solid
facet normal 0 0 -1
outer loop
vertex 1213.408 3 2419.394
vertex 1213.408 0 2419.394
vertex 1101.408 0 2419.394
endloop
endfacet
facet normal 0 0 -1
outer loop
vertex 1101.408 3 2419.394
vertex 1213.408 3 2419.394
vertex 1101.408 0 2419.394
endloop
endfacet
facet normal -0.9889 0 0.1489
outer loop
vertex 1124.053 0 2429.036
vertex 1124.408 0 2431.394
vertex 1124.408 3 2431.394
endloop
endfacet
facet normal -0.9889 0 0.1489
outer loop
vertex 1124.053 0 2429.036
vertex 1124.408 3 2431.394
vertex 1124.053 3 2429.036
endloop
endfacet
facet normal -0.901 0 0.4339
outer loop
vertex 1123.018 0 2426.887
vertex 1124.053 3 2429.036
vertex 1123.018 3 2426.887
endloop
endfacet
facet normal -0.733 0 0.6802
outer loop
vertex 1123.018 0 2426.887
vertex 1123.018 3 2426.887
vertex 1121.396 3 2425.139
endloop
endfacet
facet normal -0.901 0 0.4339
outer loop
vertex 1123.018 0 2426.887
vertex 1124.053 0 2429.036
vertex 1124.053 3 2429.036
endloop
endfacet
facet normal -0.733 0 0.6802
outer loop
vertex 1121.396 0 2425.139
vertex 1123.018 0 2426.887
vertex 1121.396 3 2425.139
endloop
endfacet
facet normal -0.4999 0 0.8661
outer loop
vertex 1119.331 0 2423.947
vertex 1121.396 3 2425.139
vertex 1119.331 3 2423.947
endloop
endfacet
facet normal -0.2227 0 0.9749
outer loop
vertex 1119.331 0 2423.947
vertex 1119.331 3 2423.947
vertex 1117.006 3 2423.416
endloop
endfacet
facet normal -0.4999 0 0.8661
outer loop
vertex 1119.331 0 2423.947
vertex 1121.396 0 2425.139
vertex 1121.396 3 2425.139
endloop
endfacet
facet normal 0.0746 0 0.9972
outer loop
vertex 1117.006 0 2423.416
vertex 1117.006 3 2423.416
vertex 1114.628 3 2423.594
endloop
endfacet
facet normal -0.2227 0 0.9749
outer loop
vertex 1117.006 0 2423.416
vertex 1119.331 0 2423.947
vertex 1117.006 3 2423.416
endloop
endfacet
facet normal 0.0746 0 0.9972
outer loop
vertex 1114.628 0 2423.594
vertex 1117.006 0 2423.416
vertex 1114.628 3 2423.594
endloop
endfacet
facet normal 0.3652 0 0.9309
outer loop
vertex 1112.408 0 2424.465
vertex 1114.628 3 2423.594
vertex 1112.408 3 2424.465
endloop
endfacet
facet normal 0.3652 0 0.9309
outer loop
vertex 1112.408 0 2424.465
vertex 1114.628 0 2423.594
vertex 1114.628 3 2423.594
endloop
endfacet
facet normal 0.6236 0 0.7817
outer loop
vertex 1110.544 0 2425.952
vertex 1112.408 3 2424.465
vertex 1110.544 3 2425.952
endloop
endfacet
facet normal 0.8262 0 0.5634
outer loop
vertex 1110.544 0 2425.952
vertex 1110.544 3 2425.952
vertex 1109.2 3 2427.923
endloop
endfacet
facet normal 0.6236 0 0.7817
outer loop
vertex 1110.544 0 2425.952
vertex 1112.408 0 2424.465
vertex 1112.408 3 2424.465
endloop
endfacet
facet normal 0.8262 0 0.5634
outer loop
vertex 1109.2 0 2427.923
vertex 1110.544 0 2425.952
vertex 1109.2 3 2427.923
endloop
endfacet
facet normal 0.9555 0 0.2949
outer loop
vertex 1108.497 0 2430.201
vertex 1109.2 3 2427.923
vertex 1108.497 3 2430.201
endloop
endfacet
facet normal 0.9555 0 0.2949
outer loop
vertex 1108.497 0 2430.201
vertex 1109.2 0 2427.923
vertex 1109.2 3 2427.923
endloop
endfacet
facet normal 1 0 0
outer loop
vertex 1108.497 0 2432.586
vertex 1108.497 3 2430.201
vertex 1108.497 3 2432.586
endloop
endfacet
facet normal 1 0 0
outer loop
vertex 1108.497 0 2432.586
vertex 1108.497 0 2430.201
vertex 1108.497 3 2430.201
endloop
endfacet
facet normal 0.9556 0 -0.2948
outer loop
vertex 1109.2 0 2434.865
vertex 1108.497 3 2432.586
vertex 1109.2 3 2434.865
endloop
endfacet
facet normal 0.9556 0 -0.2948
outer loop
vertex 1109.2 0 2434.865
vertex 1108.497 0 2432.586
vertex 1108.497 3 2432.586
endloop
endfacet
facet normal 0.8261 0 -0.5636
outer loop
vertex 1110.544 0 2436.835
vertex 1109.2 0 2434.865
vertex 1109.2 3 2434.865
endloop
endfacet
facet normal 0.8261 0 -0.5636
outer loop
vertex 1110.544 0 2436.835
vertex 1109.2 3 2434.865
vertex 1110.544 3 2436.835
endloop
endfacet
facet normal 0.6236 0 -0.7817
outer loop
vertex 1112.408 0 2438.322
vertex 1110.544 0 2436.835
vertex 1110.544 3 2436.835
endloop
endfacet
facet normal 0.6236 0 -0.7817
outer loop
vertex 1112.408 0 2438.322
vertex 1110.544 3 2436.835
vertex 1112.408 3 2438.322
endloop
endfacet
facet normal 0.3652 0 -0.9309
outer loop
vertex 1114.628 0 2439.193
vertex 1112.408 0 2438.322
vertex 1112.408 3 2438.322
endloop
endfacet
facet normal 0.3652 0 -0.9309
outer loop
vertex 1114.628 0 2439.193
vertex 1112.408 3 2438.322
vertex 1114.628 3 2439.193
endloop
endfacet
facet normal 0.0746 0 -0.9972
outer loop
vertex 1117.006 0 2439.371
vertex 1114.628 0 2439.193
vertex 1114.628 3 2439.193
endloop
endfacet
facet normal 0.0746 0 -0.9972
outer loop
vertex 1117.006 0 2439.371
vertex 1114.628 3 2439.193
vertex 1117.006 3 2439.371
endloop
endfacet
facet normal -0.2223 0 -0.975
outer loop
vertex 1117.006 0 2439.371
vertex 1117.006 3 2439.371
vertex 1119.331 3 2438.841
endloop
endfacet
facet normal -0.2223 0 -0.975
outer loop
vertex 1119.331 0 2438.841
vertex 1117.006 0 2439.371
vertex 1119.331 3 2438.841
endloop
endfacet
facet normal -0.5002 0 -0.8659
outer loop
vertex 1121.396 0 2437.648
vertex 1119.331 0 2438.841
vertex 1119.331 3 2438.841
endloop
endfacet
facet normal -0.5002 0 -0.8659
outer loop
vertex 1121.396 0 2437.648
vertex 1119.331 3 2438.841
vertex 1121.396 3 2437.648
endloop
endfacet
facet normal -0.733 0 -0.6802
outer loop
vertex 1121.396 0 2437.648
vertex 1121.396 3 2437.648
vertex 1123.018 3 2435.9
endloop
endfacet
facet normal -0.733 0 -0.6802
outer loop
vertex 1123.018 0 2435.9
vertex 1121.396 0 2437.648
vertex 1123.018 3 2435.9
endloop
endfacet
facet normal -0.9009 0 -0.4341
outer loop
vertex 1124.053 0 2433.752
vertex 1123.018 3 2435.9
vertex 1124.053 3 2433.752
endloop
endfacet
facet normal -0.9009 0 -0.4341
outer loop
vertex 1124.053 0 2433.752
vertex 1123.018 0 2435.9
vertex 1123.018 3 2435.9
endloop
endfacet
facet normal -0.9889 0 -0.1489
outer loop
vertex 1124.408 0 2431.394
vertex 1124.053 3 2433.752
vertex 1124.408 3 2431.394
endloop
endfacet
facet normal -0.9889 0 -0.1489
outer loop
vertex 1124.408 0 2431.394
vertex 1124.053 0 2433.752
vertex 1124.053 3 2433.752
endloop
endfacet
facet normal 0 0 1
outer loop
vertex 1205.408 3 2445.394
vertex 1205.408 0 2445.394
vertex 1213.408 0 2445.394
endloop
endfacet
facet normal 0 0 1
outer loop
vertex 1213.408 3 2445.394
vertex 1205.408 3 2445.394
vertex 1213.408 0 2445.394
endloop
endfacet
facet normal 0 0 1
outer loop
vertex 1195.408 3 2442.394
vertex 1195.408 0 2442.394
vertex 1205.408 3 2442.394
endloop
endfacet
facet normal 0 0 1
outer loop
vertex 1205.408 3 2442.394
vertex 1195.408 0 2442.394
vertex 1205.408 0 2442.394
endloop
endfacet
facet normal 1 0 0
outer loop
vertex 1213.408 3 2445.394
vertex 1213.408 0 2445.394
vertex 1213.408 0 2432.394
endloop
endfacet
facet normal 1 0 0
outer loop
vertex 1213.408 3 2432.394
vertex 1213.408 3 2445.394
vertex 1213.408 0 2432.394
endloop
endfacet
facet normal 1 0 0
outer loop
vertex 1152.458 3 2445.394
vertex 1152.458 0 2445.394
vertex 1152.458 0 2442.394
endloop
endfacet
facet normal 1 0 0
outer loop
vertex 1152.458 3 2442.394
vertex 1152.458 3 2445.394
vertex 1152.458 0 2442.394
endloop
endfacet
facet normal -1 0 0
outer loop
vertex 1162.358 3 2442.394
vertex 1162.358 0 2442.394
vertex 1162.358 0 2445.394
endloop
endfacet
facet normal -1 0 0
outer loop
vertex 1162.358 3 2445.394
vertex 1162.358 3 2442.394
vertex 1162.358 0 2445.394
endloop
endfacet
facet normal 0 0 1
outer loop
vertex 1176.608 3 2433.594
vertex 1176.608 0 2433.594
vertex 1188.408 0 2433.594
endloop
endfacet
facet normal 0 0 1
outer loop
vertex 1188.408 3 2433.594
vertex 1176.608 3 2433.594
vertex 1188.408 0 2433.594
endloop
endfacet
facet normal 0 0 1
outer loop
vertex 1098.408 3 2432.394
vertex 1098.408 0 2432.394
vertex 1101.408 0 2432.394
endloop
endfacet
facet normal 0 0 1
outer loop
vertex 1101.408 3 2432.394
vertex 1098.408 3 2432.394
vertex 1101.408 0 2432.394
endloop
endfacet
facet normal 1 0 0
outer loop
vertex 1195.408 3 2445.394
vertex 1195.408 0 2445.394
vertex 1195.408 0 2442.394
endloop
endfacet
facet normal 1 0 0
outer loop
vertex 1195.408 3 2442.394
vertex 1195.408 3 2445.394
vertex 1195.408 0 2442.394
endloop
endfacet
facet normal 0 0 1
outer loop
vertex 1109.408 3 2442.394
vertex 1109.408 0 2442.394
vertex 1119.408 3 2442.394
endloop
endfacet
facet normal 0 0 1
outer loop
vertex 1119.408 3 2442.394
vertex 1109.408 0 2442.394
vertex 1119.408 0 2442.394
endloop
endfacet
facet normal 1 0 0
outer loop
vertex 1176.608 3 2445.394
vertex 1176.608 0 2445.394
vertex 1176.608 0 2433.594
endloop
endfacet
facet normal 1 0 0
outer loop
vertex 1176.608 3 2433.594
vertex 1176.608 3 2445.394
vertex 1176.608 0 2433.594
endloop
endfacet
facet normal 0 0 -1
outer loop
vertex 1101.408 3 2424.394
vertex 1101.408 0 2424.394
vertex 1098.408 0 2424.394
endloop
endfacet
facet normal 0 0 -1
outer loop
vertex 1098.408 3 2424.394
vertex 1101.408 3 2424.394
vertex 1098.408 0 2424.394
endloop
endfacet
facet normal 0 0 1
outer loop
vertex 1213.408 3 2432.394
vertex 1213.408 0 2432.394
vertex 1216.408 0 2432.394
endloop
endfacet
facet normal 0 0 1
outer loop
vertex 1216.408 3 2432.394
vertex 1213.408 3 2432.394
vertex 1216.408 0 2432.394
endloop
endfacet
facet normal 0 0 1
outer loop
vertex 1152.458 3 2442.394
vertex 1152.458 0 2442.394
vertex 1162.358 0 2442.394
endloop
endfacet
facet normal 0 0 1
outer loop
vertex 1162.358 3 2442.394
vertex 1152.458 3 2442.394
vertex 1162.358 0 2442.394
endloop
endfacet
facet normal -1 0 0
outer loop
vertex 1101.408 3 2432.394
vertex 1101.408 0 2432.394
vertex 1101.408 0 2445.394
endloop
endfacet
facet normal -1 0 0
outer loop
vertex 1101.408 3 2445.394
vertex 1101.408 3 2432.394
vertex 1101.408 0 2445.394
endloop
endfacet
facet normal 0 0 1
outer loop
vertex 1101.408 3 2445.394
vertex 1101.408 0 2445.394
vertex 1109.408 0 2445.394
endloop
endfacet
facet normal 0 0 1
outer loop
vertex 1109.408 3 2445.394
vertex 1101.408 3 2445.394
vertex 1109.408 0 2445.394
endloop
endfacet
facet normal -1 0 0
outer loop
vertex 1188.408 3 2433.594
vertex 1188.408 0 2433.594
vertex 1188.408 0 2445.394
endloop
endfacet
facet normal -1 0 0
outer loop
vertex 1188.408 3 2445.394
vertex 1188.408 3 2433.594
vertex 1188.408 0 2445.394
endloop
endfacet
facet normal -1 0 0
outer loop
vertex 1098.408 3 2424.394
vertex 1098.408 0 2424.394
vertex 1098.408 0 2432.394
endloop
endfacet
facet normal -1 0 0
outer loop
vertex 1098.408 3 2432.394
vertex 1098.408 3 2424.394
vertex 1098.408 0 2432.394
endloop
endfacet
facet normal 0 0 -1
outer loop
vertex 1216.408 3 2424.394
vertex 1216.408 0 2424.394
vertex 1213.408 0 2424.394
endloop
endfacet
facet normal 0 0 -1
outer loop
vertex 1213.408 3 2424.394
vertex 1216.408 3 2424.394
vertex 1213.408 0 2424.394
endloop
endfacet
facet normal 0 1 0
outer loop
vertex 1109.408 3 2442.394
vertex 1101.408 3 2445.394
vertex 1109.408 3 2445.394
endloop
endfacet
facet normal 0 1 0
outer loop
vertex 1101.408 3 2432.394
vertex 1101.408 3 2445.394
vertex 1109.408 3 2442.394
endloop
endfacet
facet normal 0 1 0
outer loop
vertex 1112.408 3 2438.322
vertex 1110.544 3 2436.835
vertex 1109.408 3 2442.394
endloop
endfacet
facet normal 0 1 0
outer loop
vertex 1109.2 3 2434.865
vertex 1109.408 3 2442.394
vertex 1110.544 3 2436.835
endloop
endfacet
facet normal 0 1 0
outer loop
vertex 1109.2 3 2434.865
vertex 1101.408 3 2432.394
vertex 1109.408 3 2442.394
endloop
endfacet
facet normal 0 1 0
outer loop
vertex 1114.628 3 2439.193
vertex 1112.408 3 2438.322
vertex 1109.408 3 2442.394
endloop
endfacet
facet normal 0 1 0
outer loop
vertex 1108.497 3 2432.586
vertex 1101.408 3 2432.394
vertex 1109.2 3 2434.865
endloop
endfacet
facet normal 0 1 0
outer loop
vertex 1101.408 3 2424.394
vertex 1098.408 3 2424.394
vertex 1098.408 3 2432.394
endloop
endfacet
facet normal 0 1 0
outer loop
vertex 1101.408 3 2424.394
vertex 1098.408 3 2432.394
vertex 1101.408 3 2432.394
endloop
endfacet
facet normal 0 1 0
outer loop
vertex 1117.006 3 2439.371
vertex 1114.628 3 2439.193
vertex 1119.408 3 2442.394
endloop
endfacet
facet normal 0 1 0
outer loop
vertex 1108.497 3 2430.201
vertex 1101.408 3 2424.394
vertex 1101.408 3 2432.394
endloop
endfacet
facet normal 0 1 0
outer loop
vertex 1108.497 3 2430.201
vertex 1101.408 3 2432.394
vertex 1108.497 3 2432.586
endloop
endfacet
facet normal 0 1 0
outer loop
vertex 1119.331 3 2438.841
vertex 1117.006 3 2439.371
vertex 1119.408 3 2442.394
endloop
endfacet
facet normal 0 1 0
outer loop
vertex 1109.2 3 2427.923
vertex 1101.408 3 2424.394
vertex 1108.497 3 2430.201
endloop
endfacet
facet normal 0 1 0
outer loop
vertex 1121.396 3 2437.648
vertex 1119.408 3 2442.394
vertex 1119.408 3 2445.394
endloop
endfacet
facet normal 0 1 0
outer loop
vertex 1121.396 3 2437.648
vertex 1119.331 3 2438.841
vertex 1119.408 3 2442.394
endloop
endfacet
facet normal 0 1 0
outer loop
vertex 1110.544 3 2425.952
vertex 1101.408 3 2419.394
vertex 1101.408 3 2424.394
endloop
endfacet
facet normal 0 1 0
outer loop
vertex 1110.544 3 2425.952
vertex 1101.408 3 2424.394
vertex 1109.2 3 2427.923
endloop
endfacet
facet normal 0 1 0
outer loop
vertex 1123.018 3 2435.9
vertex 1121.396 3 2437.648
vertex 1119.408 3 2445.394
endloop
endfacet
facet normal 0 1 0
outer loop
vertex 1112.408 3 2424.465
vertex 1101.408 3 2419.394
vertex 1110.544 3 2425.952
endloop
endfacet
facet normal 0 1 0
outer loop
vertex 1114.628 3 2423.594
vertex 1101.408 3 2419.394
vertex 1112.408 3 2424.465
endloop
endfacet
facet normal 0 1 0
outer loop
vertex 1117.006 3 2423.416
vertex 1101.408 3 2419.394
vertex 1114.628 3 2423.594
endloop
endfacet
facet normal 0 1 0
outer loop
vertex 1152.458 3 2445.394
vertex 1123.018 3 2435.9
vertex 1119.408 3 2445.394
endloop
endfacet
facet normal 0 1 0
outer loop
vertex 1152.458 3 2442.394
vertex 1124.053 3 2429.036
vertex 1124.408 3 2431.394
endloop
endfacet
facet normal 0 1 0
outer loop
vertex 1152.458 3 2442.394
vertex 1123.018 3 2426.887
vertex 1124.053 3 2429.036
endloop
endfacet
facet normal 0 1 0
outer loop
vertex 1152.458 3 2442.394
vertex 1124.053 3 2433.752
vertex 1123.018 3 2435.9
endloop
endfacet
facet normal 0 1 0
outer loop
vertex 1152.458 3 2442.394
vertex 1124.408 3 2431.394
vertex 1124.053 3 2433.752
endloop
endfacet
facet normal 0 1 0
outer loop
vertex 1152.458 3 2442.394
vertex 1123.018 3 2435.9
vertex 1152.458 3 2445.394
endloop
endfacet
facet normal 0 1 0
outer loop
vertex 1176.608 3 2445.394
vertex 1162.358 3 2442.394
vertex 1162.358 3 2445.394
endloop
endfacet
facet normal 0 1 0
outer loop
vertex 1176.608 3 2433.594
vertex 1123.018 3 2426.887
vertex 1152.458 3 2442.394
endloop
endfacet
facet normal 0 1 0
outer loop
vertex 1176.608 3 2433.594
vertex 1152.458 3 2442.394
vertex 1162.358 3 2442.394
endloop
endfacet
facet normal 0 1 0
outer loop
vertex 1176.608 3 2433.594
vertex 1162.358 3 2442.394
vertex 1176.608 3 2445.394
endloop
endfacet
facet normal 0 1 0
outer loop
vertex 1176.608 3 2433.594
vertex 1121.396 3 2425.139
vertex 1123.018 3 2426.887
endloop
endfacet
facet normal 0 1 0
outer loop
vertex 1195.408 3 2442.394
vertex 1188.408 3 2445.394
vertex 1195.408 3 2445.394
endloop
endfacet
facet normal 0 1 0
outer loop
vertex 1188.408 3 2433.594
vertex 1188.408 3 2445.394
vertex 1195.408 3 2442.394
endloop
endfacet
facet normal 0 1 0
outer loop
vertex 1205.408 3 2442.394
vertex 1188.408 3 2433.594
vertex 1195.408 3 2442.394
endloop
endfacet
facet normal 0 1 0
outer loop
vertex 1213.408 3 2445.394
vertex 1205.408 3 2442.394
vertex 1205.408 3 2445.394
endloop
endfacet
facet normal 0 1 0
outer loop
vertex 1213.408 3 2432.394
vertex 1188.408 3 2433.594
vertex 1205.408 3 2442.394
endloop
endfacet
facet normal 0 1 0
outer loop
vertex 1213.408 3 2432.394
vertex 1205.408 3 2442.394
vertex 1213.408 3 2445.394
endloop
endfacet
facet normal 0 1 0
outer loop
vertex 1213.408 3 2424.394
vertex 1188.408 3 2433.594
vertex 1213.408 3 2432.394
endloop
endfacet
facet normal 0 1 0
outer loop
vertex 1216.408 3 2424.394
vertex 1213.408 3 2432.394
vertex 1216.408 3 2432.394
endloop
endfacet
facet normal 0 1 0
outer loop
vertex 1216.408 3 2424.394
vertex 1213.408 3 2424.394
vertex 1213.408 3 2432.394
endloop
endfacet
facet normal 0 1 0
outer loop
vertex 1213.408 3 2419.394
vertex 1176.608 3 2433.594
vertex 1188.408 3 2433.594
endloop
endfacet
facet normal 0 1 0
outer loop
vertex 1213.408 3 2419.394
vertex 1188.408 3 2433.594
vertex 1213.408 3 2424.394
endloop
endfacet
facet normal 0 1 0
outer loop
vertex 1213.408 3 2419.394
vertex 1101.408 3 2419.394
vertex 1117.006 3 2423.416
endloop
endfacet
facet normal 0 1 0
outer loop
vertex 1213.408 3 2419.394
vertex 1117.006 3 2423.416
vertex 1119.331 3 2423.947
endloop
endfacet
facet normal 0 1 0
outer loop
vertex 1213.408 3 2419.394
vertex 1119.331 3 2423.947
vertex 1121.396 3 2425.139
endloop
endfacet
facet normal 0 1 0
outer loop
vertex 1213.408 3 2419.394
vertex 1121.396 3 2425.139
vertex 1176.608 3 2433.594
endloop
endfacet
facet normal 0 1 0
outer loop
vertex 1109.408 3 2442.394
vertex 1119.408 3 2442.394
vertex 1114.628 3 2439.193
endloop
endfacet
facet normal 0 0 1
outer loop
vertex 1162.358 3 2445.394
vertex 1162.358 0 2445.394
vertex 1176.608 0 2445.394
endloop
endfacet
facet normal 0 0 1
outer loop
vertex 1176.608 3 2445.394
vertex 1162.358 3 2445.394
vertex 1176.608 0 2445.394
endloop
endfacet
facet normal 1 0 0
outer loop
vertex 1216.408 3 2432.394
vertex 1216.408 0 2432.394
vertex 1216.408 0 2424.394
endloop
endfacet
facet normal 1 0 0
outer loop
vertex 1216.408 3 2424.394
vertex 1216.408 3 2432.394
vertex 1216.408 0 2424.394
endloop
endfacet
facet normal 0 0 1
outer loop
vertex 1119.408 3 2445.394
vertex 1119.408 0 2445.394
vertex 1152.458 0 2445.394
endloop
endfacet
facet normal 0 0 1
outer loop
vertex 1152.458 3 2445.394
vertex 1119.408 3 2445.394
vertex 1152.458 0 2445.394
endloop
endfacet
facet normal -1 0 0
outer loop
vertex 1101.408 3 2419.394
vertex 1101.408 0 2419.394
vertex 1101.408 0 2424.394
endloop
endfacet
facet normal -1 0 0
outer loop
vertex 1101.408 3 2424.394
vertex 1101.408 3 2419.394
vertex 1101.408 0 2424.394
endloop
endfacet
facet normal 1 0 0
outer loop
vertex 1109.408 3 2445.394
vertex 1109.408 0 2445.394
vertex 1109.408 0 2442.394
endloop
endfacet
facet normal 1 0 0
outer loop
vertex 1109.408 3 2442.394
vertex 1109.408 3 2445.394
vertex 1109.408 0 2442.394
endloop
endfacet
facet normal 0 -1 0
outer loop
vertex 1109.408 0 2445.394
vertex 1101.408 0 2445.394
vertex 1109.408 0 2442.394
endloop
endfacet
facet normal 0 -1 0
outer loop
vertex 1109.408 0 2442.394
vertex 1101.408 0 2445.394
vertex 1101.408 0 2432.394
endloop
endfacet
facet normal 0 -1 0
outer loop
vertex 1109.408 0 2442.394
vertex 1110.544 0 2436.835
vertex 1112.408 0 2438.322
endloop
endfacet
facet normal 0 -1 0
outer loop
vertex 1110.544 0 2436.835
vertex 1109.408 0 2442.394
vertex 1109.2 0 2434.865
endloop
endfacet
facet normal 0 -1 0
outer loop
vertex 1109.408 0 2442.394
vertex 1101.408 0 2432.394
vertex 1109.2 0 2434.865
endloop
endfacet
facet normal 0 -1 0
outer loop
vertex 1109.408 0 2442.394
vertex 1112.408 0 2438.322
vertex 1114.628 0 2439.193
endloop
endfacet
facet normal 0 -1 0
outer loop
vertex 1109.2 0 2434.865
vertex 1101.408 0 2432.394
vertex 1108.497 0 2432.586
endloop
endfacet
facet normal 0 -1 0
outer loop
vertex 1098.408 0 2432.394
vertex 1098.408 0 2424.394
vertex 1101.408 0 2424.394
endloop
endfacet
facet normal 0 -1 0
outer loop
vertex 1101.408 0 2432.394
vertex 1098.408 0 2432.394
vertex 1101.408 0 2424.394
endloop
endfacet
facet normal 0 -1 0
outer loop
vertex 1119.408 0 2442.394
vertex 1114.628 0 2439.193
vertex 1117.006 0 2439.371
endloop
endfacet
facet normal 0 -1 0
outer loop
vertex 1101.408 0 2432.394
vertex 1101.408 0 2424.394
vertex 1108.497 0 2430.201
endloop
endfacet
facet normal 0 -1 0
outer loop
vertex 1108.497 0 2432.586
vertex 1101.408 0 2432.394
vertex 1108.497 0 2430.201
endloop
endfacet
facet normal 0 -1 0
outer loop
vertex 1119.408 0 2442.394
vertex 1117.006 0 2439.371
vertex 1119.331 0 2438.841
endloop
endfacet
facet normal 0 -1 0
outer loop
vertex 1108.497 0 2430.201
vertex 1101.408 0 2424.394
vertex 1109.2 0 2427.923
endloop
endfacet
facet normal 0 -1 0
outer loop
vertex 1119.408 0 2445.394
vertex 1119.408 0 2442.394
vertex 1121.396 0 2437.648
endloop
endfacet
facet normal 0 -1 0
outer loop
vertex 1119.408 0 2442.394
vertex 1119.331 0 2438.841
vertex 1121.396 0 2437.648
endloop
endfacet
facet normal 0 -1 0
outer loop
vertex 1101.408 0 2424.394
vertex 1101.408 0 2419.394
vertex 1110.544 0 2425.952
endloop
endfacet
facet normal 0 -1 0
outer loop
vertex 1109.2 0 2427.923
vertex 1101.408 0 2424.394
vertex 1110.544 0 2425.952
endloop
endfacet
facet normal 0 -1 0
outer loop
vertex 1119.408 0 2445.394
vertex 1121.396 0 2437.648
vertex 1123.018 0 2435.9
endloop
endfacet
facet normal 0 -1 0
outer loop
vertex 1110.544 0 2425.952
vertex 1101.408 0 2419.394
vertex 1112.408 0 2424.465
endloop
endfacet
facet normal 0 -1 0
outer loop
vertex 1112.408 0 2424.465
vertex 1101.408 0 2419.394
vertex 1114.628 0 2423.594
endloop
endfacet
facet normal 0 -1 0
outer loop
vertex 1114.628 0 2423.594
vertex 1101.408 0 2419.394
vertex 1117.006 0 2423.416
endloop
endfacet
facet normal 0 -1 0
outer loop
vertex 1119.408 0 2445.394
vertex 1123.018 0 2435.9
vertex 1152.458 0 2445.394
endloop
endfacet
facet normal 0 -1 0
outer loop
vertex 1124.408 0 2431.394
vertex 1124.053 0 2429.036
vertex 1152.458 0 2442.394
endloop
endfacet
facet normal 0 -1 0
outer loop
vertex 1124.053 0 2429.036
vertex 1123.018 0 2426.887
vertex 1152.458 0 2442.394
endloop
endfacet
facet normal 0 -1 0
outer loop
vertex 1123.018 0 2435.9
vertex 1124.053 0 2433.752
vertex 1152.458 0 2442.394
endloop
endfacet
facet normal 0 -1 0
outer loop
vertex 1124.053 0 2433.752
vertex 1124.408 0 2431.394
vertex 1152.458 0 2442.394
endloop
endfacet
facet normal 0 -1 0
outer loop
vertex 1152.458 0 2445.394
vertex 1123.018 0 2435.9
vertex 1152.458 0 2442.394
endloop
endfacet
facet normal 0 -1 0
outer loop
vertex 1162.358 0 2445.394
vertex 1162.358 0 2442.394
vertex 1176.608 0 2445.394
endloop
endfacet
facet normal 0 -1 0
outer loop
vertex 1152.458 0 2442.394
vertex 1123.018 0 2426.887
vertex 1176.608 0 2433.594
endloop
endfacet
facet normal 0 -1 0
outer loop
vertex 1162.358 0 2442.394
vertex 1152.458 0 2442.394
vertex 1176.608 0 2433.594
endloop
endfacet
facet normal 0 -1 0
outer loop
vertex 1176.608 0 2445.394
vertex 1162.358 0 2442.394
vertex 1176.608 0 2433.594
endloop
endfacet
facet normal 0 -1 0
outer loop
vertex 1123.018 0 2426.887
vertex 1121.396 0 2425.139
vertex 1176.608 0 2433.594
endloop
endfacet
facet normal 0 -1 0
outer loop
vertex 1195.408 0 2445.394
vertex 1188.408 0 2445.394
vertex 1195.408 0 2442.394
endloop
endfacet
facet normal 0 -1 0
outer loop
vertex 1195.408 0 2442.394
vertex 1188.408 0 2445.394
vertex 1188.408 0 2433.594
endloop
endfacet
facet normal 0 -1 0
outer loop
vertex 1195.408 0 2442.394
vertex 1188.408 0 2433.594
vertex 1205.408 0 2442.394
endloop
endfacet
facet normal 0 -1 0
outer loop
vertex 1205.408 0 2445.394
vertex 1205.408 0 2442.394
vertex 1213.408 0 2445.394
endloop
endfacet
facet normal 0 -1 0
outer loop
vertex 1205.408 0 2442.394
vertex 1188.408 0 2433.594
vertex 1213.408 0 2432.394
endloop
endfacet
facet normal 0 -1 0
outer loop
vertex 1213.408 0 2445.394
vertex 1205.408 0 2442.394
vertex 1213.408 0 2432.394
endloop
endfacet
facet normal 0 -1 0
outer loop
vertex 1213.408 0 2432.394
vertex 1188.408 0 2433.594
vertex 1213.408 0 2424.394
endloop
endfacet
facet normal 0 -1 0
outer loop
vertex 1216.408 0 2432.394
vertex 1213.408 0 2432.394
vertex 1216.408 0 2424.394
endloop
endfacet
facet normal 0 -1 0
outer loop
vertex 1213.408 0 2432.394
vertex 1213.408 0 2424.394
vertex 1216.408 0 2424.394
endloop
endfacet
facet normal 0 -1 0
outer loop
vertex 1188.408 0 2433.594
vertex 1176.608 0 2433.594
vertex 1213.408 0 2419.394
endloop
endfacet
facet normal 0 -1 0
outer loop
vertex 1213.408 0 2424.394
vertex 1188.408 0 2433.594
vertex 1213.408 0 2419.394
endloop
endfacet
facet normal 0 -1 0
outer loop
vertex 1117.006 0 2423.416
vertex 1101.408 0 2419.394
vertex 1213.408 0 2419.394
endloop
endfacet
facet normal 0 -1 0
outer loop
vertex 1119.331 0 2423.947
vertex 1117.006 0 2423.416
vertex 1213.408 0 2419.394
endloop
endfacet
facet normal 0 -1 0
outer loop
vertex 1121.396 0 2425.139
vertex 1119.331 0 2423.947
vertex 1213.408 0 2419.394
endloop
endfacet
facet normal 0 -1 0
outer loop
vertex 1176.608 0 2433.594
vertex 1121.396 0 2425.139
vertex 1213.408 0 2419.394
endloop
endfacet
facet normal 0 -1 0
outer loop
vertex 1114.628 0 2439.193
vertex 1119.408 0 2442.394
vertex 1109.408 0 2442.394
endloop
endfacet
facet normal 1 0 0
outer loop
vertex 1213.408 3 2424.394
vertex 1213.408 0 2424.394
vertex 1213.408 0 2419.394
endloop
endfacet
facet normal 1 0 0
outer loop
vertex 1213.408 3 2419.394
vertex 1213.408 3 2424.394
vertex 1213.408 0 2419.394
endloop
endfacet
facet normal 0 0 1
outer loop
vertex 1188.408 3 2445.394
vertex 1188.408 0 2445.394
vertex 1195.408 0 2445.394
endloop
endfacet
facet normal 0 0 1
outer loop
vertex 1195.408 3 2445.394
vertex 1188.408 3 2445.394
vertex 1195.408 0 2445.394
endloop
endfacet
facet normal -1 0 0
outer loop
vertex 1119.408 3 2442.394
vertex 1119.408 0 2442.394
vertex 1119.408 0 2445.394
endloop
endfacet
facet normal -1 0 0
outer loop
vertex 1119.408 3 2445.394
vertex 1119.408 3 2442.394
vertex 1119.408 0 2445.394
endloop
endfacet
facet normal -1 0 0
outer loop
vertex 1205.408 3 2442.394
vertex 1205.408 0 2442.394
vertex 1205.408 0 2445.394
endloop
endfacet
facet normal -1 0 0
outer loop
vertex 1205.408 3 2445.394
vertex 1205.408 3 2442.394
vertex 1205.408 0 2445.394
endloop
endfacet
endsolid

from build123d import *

# Parameters (mm, degrees)
SKETCH1_R           = 8
BOSS_EXTRUDE1_DEPTH = 3


with BuildPart() as part:
    # Sketch1 → Boss-Extrude1 (new body)
    with BuildSketch(Plane(origin=(0, 0, 0), x_dir=(1, 0, 0), z_dir=(0, 1, 0))):
        Polygon((1213.408125786, -2432.393668664), (1216.408125786, -2432.393668664), (1216.408125786, -2424.393668664), (1213.408125786, -2424.393668664), (1213.408125786, -2419.393668664), (1101.408125786, -2419.393668664), (1101.408125786, -2424.393668664), (1098.408125786, -2424.393668664), (1098.408125786, -2432.393668664), (1101.408125786, -2432.393668664), (1101.408125786, -2445.393668664), (1109.408125786, -2445.393668664), (1109.408125786, -2442.393668664), (1119.408125786, -2442.393668664), (1119.408125786, -2445.393668664), (1152.458125786, -2445.393668664), (1152.458125786, -2442.393668664), (1162.358125786, -2442.393668664), (1162.358125786, -2445.393668664), (1176.608125786, -2445.393668664), (1176.608125786, -2433.593668664), (1188.408125786, -2433.593668664), (1188.408125786, -2445.393668664), (1195.408125786, -2445.393668664), (1195.408125786, -2442.393668664), (1205.408125786, -2442.393668664), (1205.408125786, -2445.393668664), (1213.408125786, -2445.393668664), align=None)
        with Locations((1116.408125786, -2431.393668664)):
            Circle(SKETCH1_R, mode=Mode.SUBTRACT)
    extrude(amount=BOSS_EXTRUDE1_DEPTH)


solid = part.part
